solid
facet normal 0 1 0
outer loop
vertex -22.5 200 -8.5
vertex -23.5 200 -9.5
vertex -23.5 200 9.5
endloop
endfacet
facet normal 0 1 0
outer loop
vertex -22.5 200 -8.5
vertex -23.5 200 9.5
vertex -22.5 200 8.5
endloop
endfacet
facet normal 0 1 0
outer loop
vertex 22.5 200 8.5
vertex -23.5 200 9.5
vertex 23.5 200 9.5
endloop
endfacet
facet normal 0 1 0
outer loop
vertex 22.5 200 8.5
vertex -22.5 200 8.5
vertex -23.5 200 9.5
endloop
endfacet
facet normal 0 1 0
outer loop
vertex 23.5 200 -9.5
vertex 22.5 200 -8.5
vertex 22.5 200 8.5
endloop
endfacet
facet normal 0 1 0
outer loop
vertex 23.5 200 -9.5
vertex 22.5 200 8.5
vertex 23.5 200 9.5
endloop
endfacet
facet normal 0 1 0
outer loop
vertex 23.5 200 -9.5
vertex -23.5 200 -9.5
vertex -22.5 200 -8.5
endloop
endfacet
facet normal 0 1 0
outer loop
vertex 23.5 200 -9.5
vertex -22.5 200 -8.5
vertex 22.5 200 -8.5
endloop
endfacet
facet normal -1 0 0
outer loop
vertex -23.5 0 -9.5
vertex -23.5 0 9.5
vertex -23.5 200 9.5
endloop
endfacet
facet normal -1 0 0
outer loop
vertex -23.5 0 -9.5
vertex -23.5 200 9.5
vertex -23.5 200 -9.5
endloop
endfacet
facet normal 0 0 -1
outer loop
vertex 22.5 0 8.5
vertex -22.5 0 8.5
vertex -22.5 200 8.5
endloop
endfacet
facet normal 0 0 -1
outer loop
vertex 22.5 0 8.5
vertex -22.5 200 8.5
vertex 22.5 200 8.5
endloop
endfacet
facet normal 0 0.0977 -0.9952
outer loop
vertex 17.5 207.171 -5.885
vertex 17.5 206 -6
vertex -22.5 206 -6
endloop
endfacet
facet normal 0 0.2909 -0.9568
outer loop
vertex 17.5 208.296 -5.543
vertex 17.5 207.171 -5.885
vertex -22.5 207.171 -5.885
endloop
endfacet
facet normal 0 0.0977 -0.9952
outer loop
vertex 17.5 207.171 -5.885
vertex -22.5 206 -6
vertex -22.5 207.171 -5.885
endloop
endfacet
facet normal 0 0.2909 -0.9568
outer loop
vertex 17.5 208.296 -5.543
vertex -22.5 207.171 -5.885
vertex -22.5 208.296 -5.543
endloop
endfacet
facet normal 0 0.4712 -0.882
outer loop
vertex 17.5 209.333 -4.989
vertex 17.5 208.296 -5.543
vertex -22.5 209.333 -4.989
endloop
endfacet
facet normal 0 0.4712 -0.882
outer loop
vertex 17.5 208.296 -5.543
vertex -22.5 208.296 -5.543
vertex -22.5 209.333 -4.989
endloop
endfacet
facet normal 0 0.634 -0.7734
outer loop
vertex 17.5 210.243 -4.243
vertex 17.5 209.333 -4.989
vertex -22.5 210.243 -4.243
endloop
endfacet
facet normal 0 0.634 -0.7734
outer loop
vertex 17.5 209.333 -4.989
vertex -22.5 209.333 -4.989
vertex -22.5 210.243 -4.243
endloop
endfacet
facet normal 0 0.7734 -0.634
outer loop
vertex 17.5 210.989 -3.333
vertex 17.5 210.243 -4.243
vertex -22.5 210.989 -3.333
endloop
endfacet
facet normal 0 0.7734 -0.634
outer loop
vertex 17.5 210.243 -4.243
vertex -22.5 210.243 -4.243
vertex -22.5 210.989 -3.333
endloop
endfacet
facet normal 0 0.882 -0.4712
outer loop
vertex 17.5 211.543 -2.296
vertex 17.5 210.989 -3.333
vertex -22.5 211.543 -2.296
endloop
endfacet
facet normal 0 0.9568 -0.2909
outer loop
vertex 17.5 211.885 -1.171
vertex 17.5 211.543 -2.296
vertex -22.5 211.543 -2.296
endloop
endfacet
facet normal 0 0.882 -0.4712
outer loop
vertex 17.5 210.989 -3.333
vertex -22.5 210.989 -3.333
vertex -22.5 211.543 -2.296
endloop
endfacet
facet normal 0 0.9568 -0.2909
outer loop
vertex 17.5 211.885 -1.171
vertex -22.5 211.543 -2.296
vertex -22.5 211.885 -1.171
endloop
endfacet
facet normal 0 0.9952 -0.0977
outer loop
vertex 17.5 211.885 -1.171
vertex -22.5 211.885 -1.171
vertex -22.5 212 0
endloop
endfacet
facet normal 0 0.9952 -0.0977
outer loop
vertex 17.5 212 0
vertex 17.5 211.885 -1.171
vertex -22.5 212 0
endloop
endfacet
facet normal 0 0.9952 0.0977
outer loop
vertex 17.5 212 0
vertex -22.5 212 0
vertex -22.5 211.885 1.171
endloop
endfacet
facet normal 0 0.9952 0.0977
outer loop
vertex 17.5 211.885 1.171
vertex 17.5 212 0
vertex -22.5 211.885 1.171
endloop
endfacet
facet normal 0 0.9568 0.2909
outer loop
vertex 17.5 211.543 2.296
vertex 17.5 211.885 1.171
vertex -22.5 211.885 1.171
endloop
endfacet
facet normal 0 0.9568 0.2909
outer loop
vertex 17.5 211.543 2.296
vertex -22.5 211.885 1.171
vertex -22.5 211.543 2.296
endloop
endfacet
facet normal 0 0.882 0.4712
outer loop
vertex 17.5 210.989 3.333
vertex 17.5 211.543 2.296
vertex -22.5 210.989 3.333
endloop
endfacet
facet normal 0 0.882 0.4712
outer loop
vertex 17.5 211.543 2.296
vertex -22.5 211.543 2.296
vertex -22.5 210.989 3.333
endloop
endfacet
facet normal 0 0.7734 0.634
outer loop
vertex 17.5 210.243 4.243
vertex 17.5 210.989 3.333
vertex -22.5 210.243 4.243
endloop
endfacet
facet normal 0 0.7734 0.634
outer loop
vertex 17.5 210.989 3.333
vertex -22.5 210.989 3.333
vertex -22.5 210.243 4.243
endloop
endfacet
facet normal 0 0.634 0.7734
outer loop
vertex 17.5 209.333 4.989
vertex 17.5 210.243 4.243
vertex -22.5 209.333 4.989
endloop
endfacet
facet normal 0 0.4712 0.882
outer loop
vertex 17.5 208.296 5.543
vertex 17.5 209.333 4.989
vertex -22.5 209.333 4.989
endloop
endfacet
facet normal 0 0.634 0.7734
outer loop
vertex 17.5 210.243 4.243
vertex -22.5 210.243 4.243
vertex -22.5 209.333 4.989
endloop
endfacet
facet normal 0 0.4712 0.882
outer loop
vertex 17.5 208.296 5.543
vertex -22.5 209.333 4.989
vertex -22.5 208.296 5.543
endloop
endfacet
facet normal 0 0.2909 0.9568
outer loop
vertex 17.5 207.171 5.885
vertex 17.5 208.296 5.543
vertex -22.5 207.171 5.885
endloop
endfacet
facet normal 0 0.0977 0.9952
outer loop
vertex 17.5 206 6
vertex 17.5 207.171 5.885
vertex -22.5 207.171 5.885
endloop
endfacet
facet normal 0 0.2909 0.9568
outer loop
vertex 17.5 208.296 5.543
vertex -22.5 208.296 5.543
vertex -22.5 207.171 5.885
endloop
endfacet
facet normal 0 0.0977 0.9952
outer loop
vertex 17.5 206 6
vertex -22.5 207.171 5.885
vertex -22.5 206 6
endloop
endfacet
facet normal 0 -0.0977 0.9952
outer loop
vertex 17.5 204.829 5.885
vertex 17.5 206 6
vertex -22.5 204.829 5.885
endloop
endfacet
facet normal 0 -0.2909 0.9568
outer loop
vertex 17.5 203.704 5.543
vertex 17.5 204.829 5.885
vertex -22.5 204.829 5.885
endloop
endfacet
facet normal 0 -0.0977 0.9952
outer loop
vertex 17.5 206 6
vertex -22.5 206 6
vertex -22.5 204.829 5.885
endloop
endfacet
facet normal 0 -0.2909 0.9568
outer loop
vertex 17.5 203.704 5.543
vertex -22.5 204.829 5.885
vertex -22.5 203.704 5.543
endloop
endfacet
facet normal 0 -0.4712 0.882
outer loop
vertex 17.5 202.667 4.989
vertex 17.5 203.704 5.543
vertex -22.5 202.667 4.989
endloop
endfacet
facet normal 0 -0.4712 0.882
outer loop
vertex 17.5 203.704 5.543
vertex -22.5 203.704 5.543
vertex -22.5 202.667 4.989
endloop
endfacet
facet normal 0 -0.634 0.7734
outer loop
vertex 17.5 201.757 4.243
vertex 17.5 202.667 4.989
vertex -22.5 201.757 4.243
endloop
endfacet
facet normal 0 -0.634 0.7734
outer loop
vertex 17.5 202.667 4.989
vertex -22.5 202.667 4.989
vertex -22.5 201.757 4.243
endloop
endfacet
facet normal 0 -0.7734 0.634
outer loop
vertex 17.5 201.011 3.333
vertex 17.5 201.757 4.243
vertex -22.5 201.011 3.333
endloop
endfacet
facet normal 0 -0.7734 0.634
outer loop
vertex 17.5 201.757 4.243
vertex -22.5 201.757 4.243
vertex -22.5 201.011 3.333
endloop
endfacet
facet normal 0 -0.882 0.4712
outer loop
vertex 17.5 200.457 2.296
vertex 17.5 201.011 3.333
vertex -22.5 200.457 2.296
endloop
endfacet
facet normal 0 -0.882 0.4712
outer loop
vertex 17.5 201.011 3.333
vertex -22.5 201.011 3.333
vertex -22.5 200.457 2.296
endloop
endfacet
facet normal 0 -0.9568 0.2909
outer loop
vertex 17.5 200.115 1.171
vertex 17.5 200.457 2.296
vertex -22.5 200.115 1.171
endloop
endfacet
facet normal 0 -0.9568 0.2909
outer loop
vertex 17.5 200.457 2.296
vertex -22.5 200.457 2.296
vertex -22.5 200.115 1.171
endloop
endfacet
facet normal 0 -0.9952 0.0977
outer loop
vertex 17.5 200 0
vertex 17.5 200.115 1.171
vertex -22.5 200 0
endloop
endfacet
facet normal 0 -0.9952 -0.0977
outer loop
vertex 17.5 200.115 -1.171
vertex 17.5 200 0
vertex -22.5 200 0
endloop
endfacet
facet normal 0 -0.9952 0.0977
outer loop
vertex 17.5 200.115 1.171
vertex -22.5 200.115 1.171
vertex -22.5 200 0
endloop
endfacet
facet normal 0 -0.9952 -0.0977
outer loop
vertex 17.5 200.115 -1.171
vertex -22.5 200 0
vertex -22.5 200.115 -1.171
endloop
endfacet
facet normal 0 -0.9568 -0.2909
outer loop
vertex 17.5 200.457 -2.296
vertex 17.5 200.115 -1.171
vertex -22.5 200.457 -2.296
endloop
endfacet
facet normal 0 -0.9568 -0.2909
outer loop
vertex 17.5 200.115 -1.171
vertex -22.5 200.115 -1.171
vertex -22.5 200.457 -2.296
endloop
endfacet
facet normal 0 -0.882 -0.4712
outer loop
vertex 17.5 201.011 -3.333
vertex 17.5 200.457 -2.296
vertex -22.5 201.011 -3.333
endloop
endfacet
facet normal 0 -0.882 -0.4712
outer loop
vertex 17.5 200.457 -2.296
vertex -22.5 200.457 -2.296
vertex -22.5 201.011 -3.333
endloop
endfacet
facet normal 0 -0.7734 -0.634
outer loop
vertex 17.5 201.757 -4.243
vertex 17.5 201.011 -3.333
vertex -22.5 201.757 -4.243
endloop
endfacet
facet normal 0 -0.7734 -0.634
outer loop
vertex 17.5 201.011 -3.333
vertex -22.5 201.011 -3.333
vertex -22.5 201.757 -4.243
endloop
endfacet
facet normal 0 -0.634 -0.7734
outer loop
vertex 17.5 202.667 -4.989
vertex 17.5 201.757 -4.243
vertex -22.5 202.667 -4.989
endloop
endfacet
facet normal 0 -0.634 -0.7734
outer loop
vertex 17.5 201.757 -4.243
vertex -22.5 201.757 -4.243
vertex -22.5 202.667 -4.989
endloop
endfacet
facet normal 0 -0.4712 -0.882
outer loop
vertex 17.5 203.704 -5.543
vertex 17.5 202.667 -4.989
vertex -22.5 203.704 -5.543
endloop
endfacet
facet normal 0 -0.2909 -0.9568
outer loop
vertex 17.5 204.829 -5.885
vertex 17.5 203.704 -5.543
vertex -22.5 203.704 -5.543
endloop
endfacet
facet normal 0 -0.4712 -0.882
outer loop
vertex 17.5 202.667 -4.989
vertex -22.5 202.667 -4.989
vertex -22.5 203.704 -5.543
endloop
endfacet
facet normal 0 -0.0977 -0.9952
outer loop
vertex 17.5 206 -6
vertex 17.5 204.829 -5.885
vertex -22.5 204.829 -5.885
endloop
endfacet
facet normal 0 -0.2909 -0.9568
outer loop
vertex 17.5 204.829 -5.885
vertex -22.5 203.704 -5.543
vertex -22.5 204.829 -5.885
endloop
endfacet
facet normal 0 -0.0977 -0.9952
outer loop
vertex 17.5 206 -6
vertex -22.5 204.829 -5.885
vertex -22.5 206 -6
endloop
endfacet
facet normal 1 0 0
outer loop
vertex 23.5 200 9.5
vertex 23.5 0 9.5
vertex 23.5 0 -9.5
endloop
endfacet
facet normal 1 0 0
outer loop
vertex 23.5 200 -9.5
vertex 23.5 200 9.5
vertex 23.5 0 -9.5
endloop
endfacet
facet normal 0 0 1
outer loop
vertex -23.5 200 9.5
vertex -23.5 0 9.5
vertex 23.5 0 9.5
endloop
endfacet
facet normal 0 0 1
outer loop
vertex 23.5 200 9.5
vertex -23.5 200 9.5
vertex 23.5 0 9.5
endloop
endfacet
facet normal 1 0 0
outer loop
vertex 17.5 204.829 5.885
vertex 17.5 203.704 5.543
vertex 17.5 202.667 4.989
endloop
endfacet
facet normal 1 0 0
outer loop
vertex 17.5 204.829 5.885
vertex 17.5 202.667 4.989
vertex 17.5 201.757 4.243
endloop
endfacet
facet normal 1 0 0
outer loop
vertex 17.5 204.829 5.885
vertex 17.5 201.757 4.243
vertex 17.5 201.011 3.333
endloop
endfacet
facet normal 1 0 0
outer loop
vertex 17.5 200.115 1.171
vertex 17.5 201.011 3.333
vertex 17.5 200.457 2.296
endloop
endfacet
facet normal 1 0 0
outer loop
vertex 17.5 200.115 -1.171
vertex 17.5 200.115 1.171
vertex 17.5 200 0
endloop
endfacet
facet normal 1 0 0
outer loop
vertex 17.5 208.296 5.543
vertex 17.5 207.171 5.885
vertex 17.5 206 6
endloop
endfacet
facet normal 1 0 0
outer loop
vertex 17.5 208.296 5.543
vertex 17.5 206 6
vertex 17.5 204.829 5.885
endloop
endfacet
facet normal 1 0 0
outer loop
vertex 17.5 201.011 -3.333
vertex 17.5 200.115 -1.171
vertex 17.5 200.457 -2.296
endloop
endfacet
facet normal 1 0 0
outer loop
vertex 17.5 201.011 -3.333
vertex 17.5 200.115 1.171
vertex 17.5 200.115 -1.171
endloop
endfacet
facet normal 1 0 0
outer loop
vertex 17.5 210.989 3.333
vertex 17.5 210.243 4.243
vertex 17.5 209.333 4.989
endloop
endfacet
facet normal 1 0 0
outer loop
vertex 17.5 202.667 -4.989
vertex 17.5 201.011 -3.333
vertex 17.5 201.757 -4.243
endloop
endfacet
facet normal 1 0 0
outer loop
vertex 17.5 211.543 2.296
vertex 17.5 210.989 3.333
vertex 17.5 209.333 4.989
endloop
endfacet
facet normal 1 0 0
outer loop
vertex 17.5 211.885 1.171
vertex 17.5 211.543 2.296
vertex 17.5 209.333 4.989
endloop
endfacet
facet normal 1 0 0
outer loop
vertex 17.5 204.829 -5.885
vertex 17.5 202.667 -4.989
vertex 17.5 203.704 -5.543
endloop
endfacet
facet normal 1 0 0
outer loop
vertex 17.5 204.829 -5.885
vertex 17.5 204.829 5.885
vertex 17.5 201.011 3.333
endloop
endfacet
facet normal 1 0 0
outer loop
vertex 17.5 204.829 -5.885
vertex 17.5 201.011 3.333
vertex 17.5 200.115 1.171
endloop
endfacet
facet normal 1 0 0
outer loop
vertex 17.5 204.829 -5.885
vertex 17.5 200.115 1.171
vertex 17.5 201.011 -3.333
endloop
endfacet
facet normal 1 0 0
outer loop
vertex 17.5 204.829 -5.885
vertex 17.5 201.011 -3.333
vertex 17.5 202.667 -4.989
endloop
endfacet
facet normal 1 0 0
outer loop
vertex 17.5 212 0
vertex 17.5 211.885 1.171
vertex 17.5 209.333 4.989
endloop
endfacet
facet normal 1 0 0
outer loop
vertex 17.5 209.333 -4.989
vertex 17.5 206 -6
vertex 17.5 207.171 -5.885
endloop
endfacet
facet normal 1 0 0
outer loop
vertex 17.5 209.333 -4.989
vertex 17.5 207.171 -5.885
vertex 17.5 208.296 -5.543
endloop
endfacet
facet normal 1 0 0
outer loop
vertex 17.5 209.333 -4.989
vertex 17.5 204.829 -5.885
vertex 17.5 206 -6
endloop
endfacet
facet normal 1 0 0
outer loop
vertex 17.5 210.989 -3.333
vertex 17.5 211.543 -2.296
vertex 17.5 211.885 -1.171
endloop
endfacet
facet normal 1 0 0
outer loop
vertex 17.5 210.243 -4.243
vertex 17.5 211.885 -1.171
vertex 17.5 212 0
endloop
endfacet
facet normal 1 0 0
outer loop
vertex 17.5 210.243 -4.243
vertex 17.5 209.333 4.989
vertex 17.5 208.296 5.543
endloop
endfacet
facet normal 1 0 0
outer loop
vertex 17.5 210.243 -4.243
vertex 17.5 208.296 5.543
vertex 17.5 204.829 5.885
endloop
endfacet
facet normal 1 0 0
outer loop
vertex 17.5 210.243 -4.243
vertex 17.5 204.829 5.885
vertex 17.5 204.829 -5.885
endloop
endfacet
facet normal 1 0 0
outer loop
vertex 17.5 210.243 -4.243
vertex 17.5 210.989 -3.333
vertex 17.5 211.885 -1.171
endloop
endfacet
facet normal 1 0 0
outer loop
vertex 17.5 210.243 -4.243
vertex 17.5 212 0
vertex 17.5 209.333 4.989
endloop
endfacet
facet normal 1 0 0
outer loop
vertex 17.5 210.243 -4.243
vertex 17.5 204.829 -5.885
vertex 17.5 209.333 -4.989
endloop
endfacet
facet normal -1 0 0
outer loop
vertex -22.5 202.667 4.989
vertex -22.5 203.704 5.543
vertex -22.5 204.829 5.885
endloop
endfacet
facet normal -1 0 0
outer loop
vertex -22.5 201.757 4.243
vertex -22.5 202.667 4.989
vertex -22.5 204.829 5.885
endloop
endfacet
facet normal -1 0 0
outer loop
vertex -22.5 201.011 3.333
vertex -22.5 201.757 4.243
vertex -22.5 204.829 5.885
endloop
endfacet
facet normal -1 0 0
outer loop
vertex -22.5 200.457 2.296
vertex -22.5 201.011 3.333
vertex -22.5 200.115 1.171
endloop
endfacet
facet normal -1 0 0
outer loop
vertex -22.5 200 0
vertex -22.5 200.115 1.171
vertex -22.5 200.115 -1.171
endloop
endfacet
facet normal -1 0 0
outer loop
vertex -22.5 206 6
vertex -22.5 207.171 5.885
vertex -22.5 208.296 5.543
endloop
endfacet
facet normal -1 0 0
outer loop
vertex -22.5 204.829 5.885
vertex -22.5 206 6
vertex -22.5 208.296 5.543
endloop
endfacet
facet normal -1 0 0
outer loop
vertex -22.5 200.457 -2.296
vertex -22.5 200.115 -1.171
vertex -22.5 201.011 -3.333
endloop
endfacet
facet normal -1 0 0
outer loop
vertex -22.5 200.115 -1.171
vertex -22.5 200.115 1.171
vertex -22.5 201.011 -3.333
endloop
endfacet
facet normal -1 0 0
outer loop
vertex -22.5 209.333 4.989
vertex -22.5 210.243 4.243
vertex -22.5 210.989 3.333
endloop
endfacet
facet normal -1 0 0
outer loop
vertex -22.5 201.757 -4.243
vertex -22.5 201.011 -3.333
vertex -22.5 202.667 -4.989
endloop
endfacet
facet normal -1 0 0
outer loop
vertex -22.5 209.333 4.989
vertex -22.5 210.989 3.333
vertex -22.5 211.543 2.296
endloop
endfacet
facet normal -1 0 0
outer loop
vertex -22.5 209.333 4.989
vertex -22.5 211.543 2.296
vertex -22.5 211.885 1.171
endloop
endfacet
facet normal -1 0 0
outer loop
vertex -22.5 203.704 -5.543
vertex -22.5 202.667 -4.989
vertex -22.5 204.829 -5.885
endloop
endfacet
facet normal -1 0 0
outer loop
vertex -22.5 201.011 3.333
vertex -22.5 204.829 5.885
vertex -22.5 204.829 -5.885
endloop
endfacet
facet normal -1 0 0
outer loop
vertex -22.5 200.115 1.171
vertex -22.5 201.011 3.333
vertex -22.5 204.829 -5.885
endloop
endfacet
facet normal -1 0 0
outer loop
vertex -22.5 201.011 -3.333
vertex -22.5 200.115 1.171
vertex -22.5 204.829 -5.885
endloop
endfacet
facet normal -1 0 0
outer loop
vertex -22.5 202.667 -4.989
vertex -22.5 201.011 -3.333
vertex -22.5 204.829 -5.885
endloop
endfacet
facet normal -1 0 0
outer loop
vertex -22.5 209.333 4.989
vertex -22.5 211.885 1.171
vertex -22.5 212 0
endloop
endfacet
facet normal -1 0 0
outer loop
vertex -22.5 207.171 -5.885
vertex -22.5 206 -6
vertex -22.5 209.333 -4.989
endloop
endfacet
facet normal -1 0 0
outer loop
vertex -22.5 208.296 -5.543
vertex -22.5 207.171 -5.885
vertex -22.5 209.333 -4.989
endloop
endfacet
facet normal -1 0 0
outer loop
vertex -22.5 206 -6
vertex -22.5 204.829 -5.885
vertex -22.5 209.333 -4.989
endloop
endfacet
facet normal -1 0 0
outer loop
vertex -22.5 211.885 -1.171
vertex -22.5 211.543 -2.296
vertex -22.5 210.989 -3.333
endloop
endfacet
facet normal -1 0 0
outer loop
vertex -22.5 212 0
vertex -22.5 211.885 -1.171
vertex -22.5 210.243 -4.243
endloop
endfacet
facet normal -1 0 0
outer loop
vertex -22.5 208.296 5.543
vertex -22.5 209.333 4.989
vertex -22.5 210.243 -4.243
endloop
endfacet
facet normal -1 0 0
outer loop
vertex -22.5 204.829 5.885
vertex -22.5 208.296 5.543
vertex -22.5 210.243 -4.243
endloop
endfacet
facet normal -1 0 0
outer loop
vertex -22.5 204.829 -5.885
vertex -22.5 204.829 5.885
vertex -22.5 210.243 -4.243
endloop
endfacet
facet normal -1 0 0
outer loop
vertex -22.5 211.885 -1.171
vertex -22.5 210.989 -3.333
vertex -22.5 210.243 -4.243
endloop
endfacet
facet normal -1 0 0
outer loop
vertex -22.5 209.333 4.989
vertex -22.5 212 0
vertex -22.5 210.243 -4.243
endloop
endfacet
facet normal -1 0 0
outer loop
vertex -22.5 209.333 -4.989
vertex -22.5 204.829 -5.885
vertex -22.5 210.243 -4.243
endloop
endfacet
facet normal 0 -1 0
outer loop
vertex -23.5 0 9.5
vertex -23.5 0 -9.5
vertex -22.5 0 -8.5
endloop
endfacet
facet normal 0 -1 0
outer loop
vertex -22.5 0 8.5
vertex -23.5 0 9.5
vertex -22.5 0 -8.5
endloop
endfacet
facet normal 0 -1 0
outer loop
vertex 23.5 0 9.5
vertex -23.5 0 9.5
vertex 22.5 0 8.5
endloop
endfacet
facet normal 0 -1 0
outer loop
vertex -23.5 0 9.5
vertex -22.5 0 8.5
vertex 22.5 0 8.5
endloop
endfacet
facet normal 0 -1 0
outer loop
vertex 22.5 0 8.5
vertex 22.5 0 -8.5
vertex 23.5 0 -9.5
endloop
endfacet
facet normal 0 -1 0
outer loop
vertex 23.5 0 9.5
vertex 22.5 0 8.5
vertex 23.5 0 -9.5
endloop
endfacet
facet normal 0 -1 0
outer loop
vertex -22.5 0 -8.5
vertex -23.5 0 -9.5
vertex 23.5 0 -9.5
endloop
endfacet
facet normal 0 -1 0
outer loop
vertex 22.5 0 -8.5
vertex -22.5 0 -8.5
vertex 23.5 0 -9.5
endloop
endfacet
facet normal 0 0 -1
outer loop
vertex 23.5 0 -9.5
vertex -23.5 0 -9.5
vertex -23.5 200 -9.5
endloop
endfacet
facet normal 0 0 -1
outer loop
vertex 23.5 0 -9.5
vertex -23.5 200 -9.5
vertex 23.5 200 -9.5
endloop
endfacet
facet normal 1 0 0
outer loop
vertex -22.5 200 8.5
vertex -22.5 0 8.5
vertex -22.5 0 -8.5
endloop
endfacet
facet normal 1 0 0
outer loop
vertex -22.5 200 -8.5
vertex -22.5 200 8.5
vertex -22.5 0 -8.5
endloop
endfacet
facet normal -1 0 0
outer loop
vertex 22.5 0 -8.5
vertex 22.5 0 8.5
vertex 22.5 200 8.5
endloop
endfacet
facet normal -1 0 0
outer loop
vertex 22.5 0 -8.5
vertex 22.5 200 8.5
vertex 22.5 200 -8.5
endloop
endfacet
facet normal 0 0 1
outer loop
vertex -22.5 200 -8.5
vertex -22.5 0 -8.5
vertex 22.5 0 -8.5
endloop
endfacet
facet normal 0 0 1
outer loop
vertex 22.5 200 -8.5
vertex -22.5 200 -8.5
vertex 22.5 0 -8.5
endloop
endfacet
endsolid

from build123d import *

# Parameters (mm, degrees)
SKETCH_1_W      = 47
SKETCH_1_H      = 19
SKETCH_1_W_2    = 45
SKETCH_1_H_2    = 17
EXTRUDE_1_DEPTH = 200
SKETCH_2_R      = 6
EXTRUDE_2_DEPTH = 40


with BuildPart() as part:
    # 草图1 → 凸台-拉伸1 (new body)
    with BuildSketch(Plane(origin=(0, 0, 0), x_dir=(1, 0, 0), z_dir=(0, 1, 0))):
        Rectangle(SKETCH_1_W, SKETCH_1_H)
        Rectangle(SKETCH_1_W_2, SKETCH_1_H_2, mode=Mode.SUBTRACT)
    extrude(amount=EXTRUDE_1_DEPTH)


with BuildPart() as body_2:
    # 草图2 → 凸台-拉伸2 (new body)
    with BuildSketch(Plane(origin=(-22.5, 0, 0), x_dir=(0, 0, -1), z_dir=(1, 0, 0))):
        with Locations((0, 206)):
            Circle(SKETCH_2_R)
    extrude(amount=EXTRUDE_2_DEPTH)


solid = Compound([part.part, body_2.part])
